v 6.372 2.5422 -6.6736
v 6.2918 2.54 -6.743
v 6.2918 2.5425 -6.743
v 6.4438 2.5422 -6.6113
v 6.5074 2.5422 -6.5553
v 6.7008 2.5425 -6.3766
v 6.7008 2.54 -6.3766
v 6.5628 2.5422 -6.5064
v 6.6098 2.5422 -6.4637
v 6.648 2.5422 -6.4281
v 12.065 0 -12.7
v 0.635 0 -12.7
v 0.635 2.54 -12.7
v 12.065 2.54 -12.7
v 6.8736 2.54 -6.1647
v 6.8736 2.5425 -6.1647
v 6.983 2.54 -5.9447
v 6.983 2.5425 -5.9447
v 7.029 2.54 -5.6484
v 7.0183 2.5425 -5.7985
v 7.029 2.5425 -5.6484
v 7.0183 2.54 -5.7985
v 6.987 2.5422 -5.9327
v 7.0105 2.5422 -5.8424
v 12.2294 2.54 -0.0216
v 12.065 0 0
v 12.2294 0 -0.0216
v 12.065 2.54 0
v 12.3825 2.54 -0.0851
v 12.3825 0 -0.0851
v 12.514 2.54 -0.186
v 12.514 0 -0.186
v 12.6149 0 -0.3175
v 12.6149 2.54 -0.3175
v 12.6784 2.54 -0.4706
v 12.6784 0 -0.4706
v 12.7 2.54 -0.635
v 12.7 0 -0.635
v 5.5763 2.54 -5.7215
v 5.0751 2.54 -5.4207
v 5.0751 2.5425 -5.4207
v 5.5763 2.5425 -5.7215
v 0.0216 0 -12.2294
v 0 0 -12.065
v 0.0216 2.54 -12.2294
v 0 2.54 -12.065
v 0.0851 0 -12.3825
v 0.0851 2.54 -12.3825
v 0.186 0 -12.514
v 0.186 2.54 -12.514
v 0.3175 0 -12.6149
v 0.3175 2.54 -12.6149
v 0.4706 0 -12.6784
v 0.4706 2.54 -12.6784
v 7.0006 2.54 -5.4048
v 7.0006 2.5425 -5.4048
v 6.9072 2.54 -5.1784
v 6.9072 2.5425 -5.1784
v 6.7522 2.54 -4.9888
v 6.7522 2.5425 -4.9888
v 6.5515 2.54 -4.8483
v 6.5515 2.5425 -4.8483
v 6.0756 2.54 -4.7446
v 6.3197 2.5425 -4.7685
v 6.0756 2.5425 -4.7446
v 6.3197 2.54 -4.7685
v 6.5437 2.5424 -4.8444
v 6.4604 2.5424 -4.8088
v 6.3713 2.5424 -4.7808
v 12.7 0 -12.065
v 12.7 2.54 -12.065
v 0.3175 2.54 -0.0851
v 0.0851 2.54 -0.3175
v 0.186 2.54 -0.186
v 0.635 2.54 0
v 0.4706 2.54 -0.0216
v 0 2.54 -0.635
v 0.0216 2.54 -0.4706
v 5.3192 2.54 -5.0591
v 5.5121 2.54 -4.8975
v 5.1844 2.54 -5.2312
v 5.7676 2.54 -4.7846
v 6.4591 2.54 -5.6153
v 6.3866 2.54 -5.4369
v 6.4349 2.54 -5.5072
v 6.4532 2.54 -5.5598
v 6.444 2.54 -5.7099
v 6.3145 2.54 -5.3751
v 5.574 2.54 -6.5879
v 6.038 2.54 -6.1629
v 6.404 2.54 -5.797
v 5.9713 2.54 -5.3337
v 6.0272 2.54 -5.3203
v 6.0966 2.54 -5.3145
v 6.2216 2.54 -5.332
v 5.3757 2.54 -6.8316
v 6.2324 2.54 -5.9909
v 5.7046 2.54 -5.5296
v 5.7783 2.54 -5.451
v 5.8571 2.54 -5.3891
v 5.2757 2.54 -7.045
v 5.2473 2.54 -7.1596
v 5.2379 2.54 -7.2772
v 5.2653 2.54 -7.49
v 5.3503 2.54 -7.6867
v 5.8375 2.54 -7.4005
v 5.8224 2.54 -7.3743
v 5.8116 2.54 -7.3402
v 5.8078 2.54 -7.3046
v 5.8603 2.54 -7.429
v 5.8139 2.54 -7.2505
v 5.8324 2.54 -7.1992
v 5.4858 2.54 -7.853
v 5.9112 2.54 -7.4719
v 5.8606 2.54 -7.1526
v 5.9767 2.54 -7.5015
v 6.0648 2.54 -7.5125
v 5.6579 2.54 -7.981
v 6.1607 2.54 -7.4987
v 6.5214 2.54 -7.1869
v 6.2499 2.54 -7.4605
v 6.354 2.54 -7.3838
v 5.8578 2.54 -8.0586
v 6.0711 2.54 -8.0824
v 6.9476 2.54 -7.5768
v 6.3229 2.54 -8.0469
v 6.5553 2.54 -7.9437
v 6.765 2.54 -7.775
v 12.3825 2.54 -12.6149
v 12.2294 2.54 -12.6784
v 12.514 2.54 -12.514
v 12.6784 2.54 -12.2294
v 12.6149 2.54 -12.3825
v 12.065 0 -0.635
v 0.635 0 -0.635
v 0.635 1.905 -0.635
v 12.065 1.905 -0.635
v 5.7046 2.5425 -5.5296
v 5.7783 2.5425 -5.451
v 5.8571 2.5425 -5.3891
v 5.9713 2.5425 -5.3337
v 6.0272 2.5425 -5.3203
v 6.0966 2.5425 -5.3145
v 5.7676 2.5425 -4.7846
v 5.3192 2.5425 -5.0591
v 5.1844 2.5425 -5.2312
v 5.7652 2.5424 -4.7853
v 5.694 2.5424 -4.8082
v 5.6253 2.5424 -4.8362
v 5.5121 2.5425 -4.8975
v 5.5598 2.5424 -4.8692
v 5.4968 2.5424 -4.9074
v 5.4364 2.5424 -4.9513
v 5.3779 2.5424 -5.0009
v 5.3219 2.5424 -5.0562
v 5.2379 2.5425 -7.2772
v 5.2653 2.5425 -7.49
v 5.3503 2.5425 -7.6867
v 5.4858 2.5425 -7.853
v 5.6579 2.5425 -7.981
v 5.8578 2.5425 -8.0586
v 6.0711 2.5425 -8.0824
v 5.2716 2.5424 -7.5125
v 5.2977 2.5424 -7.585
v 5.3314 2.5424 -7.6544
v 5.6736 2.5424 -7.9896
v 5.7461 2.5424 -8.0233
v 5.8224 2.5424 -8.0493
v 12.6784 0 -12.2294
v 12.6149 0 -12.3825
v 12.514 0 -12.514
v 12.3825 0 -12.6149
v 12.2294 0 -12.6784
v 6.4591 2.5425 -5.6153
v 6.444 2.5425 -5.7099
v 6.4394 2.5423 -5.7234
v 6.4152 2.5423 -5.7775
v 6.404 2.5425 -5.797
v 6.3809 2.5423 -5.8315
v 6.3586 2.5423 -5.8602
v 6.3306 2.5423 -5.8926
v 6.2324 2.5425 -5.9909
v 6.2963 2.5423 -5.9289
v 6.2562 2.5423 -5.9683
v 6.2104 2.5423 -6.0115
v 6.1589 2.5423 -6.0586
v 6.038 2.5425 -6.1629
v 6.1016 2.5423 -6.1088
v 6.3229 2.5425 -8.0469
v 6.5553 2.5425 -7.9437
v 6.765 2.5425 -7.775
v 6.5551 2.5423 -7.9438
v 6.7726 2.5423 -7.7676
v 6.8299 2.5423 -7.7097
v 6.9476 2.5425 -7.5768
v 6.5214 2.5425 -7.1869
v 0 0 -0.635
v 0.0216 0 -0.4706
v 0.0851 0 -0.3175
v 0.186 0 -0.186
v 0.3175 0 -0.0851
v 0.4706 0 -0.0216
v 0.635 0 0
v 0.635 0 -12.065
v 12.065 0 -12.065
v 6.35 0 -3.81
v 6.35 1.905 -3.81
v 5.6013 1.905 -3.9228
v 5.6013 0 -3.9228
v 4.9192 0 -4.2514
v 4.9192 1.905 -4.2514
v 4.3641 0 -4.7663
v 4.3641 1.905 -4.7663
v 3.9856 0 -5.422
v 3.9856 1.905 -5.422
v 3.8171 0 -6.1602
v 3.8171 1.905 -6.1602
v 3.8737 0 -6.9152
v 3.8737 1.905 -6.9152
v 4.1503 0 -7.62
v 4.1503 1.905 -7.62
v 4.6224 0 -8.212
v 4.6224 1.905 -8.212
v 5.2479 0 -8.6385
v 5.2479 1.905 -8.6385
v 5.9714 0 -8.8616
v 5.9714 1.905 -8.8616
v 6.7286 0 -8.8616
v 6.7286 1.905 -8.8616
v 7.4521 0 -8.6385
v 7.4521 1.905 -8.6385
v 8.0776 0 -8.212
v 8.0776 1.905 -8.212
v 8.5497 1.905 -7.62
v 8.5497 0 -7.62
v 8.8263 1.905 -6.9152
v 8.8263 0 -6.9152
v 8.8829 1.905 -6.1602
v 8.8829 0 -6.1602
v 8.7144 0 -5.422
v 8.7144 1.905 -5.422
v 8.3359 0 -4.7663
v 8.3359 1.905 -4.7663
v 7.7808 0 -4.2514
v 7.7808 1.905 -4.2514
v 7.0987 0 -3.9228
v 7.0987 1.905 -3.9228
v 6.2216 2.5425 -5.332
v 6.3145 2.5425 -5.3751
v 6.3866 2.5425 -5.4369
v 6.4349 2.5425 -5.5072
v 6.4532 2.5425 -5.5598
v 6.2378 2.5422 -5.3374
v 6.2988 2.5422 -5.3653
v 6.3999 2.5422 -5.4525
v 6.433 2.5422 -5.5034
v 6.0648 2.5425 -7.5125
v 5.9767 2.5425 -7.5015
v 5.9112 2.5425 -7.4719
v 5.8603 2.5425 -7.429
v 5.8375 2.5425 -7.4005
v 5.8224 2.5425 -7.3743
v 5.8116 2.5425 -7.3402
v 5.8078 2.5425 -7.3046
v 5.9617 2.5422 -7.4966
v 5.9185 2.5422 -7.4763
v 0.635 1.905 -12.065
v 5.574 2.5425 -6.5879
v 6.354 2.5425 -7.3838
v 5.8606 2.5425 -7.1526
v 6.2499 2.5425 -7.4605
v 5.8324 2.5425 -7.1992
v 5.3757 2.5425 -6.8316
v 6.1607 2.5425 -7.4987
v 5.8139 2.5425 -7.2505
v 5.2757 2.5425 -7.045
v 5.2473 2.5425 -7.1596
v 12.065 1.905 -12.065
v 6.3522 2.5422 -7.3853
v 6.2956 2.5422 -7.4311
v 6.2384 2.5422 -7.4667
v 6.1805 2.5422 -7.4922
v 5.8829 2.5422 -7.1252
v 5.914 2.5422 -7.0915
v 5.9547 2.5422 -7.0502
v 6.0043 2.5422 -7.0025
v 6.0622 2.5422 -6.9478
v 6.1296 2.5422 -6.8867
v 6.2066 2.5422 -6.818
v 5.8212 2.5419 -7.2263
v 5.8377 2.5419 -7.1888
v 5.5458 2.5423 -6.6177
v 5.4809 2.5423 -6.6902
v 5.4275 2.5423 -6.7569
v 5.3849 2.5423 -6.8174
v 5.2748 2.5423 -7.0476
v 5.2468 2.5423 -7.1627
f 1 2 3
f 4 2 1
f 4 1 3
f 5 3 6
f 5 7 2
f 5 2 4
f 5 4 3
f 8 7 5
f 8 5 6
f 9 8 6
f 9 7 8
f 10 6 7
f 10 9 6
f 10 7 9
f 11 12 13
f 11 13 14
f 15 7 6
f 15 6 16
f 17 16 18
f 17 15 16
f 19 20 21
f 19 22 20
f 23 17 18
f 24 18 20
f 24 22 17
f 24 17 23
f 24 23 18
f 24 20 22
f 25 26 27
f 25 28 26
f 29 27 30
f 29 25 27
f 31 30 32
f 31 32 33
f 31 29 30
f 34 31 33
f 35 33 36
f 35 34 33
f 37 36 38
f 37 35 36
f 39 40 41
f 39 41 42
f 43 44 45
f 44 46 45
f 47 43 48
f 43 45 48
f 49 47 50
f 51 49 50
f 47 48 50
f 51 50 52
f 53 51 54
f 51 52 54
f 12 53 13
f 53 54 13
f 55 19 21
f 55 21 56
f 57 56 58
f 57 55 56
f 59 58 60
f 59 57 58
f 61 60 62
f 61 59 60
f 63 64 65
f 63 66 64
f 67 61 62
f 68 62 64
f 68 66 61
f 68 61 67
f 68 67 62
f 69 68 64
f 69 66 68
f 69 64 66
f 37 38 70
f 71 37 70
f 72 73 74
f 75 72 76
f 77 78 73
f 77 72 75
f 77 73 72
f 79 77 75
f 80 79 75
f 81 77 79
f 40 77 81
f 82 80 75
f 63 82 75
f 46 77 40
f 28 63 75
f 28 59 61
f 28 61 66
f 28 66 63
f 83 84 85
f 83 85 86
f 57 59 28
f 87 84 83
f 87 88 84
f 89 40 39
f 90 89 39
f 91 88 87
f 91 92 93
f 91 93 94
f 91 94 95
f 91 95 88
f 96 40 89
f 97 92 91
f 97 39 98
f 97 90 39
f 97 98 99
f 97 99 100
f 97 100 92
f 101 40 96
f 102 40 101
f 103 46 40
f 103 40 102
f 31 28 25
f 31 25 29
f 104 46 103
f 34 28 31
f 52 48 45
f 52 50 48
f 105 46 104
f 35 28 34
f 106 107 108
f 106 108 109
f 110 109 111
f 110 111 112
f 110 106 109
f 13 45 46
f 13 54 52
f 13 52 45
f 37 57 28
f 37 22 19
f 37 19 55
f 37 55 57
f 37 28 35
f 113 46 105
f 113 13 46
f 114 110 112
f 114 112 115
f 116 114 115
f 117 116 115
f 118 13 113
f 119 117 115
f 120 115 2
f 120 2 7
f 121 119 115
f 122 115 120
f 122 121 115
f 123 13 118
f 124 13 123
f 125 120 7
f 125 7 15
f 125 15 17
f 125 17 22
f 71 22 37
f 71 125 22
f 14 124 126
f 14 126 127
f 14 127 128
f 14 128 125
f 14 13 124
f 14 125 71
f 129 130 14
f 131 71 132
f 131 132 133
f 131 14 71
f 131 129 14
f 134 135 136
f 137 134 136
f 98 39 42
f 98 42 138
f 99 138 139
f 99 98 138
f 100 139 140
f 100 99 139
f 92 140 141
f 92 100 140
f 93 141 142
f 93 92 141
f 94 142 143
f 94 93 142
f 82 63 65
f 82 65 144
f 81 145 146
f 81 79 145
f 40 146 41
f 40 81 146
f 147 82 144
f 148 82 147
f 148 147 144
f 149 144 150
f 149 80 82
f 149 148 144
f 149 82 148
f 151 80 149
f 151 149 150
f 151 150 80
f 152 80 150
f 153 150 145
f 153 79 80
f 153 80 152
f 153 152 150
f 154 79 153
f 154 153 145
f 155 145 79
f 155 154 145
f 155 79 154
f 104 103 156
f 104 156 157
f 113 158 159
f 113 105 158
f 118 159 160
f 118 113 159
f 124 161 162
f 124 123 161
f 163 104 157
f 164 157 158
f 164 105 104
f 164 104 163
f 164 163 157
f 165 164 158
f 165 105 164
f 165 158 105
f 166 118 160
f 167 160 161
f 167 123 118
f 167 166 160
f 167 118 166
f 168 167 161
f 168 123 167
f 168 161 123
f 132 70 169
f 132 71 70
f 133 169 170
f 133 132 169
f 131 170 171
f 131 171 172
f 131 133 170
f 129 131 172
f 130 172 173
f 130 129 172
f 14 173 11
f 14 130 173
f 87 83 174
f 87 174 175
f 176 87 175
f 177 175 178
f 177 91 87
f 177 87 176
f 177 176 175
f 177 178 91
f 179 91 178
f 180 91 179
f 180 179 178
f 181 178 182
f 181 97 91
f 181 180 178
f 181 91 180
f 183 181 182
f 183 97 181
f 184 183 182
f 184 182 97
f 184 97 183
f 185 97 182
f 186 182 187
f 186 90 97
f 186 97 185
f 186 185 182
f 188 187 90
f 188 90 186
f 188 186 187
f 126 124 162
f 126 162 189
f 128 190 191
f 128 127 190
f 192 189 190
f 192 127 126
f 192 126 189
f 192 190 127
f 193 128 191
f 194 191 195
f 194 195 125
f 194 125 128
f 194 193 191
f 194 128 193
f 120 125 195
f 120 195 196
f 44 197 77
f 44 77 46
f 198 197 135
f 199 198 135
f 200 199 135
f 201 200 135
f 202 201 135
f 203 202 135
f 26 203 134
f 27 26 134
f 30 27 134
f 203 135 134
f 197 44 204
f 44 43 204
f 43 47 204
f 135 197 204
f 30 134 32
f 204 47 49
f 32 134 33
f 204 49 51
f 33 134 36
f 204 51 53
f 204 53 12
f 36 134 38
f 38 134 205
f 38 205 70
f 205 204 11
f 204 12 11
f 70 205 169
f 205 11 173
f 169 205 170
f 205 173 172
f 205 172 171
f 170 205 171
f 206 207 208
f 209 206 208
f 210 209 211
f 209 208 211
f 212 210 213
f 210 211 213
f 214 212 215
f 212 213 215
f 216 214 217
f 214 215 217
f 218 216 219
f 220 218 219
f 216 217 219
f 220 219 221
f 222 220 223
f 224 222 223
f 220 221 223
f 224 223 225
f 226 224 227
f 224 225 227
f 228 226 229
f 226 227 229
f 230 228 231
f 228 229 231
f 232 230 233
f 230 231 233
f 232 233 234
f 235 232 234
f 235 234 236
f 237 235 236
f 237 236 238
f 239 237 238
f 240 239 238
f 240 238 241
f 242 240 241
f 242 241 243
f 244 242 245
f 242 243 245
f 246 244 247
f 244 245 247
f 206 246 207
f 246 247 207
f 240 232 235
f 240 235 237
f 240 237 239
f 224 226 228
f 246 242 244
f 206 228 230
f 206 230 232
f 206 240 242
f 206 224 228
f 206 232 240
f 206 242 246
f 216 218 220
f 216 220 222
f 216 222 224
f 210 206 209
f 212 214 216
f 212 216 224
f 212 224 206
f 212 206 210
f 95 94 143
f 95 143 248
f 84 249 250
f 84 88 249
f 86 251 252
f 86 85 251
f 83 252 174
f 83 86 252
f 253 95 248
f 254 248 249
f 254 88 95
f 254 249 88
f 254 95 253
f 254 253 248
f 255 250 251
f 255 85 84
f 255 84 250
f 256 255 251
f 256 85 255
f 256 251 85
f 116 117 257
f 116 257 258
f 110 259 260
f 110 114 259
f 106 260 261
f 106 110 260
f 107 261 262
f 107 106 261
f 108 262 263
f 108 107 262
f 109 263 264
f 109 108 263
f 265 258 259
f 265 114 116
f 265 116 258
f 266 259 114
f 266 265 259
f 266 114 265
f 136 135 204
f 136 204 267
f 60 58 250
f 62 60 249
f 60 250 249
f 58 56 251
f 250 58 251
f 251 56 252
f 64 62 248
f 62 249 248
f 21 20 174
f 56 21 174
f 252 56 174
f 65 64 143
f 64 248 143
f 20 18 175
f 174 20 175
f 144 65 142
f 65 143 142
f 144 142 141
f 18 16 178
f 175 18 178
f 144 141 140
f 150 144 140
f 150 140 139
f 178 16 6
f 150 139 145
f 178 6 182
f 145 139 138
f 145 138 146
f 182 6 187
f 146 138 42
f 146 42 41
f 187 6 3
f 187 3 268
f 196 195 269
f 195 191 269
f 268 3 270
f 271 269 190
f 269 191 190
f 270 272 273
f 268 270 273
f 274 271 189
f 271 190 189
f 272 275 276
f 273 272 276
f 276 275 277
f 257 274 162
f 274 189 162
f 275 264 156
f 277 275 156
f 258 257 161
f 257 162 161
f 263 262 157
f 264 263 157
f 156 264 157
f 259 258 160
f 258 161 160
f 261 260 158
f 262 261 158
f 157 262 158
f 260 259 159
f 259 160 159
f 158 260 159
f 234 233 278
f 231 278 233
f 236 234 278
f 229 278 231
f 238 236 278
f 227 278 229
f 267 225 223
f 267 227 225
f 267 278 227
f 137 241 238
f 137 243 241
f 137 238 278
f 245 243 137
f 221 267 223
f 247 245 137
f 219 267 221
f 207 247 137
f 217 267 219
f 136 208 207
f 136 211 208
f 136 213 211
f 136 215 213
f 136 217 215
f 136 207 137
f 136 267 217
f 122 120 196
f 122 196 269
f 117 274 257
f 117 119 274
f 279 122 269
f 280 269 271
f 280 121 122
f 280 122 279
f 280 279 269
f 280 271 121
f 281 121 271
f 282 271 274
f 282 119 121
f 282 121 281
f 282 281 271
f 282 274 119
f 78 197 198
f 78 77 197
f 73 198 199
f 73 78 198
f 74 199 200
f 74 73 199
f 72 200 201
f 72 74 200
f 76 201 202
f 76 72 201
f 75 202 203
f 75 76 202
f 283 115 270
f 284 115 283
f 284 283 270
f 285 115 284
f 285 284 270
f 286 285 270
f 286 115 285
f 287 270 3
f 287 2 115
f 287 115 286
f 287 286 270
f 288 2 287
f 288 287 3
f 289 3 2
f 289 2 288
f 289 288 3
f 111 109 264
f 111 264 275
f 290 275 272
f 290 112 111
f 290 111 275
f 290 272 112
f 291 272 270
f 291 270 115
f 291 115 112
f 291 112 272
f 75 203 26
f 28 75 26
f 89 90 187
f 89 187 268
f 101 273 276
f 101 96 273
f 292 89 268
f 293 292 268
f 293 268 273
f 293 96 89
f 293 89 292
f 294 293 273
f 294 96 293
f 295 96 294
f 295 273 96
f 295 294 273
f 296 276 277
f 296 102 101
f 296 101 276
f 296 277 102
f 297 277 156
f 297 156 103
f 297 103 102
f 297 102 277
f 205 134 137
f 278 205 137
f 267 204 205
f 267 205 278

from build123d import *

# Parameters (mm, degrees)
SKETCH1_W           = 12.7
SKETCH1_H           = 12.7
BOSS_EXTRUDE1_DEPTH = 2.54
FILLET1_R           = 0.635
SHELL1_START        = 0.635
SHELL1_OUTLINE_W    = 1.905
SHELL1_OUTLINE_H    = 11.43
SHELL1_DEPTH        = 11.43
SKETCH2_R           = 2.54
BOSS_EXTRUDE2_DEPTH = 1.905
BOSS_EXTRUDE3_DEPTH = 0.00254


# Read off the part's stored shape, not the designer's step: Shell1
with BuildPart() as part:
    # Sketch1 → Boss-Extrude1 (new body)
    with BuildSketch(Plane(origin=(0, 0, 0), x_dir=(1, 0, 0), z_dir=(0, 1, 0))):
        with Locations((6.35, 6.35)):
            Rectangle(SKETCH1_W, SKETCH1_H)
    extrude(amount=BOSS_EXTRUDE1_DEPTH)

    # Fillet1
    fillet1_edges = [part.edges().sort_by_distance(p)[0] for p in [
        (0, 1.27, -12.7),
        (12.7, 1.27, -12.7),
        (12.7, 1.27, 0),
        (0, 1.27, 0),
    ]]
    fillet(fillet1_edges, radius=FILLET1_R)

    # Shell1 outline → Shell1 (cut)
    with BuildSketch(Plane.YZ.offset(SHELL1_START)):
        with Locations((0.9525, -6.35)):
            Rectangle(SHELL1_OUTLINE_W, SHELL1_OUTLINE_H)
    extrude(amount=SHELL1_DEPTH, mode=Mode.SUBTRACT)

    # Sketch2 → Boss-Extrude2 (add)
    with BuildSketch(Plane(origin=(0, 1.905, 0), x_dir=(-1, 0, 0), z_dir=(0, -1, 0))):
        with Locations(Location((-6.35, 6.35, 0), (0, 0, 270))):
            Circle(SKETCH2_R)
    extrude(amount=BOSS_EXTRUDE2_DEPTH)

    # Sketch3 → Boss-Extrude3 (add)
    with BuildSketch(Plane(origin=(0, 2.54, 0), x_dir=(1, 0, 0), z_dir=(0, 1, 0))):
        with BuildLine():
            Line((6.947551282, 7.576776242), (6.521419471, 7.186897436))
            add(Edge.make_bspline(
                [(6.521419471, 7.186897436), (6.503165812, 7.21264612), (6.468121331, 7.262080004), (6.411317883, 7.328273139), (6.354770931, 7.384740809), (6.297956603, 7.431247119), (6.240371318, 7.467509507), (6.182115036, 7.493183679), (6.123518028, 7.509504993), (6.084149883, 7.51153739), (6.064758814, 7.512538462)],
                knots=[0, 0, 0, 0, 1.299362458, 2.494594718, 3.587462134, 4.587049575, 5.512617175, 6.380583204, 7.202344345, 8, 8, 8, 8], degree=3))
            add(Edge.make_bspline(
                [(6.064758814, 7.512538462), (6.046671381, 7.511904137), (6.0117493, 7.510679422), (5.961965283, 7.498505847), (5.917766323, 7.477496044), (5.879195557, 7.45002396), (5.84864182, 7.416926467), (5.82424703, 7.382215707), (5.810510714, 7.343902879), (5.808702744, 7.317588082), (5.807807692, 7.304560697)],
                knots=[0, 0, 0, 0, 1.185010067, 2.2879431, 3.333075148, 4.379039566, 5.372662701, 6.27520591, 7.14612461, 8, 8, 8, 8], degree=3))
            add(Edge.make_bspline(
                [(5.807807692, 7.304560697), (5.808368576, 7.291345451), (5.809498118, 7.264731783), (5.820407957, 7.225726137), (5.836852199, 7.18761308), (5.852565344, 7.164411849), (5.860597155, 7.152552484)],
                knots=[0, 0, 0, 0, 0.967525499, 1.948461899, 2.951351359, 4, 4, 4, 4], degree=3))
            add(Edge.make_bspline(
                [(5.860597155, 7.152552484), (5.867898941, 7.143334324), (5.884706688, 7.122115336), (5.916755618, 7.088507766), (5.957002343, 7.047335552), (6.006995642, 7.000014485), (6.064660156, 6.944842714), (6.132668709, 6.883989063), (6.209063719, 6.815568965), (6.263363522, 6.767923686), (6.291817107, 6.742957131)],
                knots=[0, 0, 0, 0, 0.473873513, 1.090794244, 1.870441696, 2.795289791, 3.865433203, 5.087734844, 6.473946851, 8, 8, 8, 8], degree=3))
            add(Edge.make_bspline(
                [(6.291817107, 6.742957131), (6.31852489, 6.719842892), (6.369210714, 6.675976869), (6.441326575, 6.613716092), (6.504704406, 6.557701589), (6.560267478, 6.508774018), (6.607173508, 6.466420016), (6.645619689, 6.430437133), (6.676075577, 6.401525888), (6.693387966, 6.384063478), (6.700776442, 6.376610978)],
                knots=[0, 0, 0, 0, 1.543621617, 2.929473131, 4.163658386, 5.240097082, 6.164993805, 6.925417477, 7.541396219, 8, 8, 8, 8], degree=3))
            add(Edge.make_bspline(
                [(6.700776442, 6.376610978), (6.72880678, 6.346276149), (6.782690932, 6.287961956), (6.852721334, 6.197593297), (6.910358621, 6.109375058), (6.954947919, 6.021647272), (6.98862355, 5.9331442), (7.012365316, 5.84169531), (7.026584417, 5.746345018), (7.02816307, 5.681280084), (7.028961538, 5.648370793)],
                knots=[0, 0, 0, 0, 1.206664779, 2.319633467, 3.337109185, 4.282041471, 5.190008762, 6.099243693, 7.03861361, 8, 8, 8, 8], degree=3))
            add(Edge.make_bspline(
                [(7.028961538, 5.648370793), (7.028393209, 5.616304725), (7.027278125, 5.553389906), (7.013620483, 5.46132344), (6.994145488, 5.373211837), (6.96403373, 5.290013874), (6.927333696, 5.210363884), (6.881324904, 5.135502559), (6.827293886, 5.064672272), (6.765366044, 4.999139201), (6.696866497, 4.939672482), (6.623394222, 4.886733804), (6.544230772, 4.843026182), (6.460052505, 4.807036073), (6.370904481, 4.77931601), (6.276892901, 4.7588283), (6.17787397, 4.746531899), (6.110163397, 4.745246456), (6.075571114, 4.744589744)],
                knots=[0, 0, 0, 0, 1.043214005, 2.046824704, 3.02475056, 3.976699089, 4.921714032, 5.875962561, 6.831408892, 7.817874052, 8.806269674, 9.781291748, 10.760897367, 11.74438705, 12.757449933, 13.795994037, 14.874007457, 16, 16, 16, 16], degree=3))
            add(Edge.make_bspline(
                [(6.075571114, 4.744589744), (6.048416466, 4.745071485), (5.994634689, 4.74602561), (5.915368481, 4.753815242), (5.838827997, 4.766386881), (5.765099453, 4.784405794), (5.693850688, 4.807238201), (5.625078777, 4.835127112), (5.559258474, 4.868504794), (5.495891752, 4.906684869), (5.435286652, 4.951016965), (5.376676846, 5.000594728), (5.320644503, 5.056180684), (5.266920509, 5.117643377), (5.215848607, 5.185156853), (5.165757029, 5.257780861), (5.118871997, 5.336863206), (5.089909027, 5.392340111), (5.075115385, 5.420676482)],
                knots=[0, 0, 0, 0, 1.016823716, 2.013894106, 2.979844003, 3.91962641, 4.853723003, 5.779685073, 6.695824784, 7.614987388, 8.547259901, 9.504950863, 10.487499108, 11.500346958, 12.559593716, 13.656357062, 14.802919212, 16, 16, 16, 16], degree=3))
            Line((5.075115385, 5.420676482), (5.576297276, 5.721512821))
            add(Edge.make_bspline(
                [(5.576297276, 5.721512821), (5.594801911, 5.689347337), (5.630276879, 5.627683355), (5.690392527, 5.54482998), (5.751977941, 5.473879779), (5.816456918, 5.416086802), (5.883045419, 5.370678281), (5.952065082, 5.338226202), (6.023564398, 5.318138402), (6.072266484, 5.315685218), (6.096559696, 5.314461538)],
                knots=[0, 0, 0, 0, 1.283663364, 2.460892379, 3.537111102, 4.529833553, 5.449777664, 6.316464042, 7.160231139, 8, 8, 8, 8], degree=3))
            add(Edge.make_bspline(
                [(6.096559696, 5.314461538), (6.12126937, 5.315460861), (6.169209736, 5.317399693), (6.237638475, 5.335308096), (6.300376534, 5.363425604), (6.354606849, 5.403545409), (6.40052566, 5.449849762), (6.434416378, 5.501365473), (6.455706756, 5.557104227), (6.457957665, 5.595824033), (6.459089744, 5.615297877)],
                knots=[0, 0, 0, 0, 1.13588714, 2.203786484, 3.234766741, 4.283437687, 5.291419208, 6.222934724, 7.106237994, 8, 8, 8, 8], degree=3))
            add(Edge.make_bspline(
                [(6.459089744, 5.615297877), (6.458044316, 5.633415119), (6.455920629, 5.670218563), (6.440278206, 5.724939365), (6.415824328, 5.779635282), (6.386893665, 5.824498352), (6.357453094, 5.862060985), (6.329301267, 5.894607307), (6.295019789, 5.930565296), (6.254695583, 5.969980182), (6.208861436, 6.013198947), (6.157478739, 6.060217356), (6.099959106, 6.110621236), (6.059304117, 6.14495586), (6.038046074, 6.162909054)],
                knots=[0, 0, 0, 0, 0.916159276, 1.861089862, 2.860218735, 3.940849679, 4.552606315, 5.27541173, 6.11797699, 7.06649574, 8.129236253, 9.306560635, 10.591630461, 12, 12, 12, 12], degree=3))
            add(Edge.make_bspline(
                [(6.038046074, 6.162909054), (5.997633688, 6.197101808), (5.920070088, 6.262728051), (5.810462881, 6.359655946), (5.711696974, 6.450243946), (5.624625414, 6.535611915), (5.548138776, 6.614183306), (5.482755059, 6.686596305), (5.429192535, 6.75340948), (5.372829528, 6.832545214), (5.319273403, 6.928977544), (5.272985712, 7.044996816), (5.242956212, 7.161001367), (5.239591824, 7.238880433), (5.237935897, 7.277211939)],
                knots=[0, 0, 0, 0, 1.345494975, 2.582412109, 3.71882943, 4.751509156, 5.681369928, 6.505683931, 7.230279997, 7.856715994, 8.973648664, 10.023341002, 11.027102913, 12, 12, 12, 12], degree=3))
            add(Edge.make_bspline(
                [(5.237935897, 7.277211939), (5.238624595, 7.304394586), (5.239981404, 7.35794732), (5.252084347, 7.436688812), (5.270172657, 7.512667736), (5.296442076, 7.585606886), (5.33053661, 7.655414903), (5.371943098, 7.722433526), (5.421304502, 7.786045931), (5.476931473, 7.846209948), (5.538218153, 7.901193012), (5.603710758, 7.949721076), (5.673038596, 7.990708584), (5.745777553, 8.024710699), (5.822378363, 8.050737157), (5.90227671, 8.069186008), (5.985587195, 8.080158796), (6.042253188, 8.08165042), (6.07111899, 8.082410256)],
                knots=[0, 0, 0, 0, 1.010766082, 1.991317756, 2.957454644, 3.913069143, 4.869106762, 5.843196583, 6.838735724, 7.860187025, 8.887984031, 9.89767229, 10.887916223, 11.879572884, 12.879850636, 13.892031539, 14.926195476, 16, 16, 16, 16], degree=3))
            add(Edge.make_bspline(
                [(6.07111899, 8.082410256), (6.108527641, 8.081041768), (6.183049652, 8.078315594), (6.293232593, 8.056997805), (6.400854684, 8.023473336), (6.487578582, 7.983029753), (6.556583169, 7.943852034), (6.609468739, 7.907782126), (6.663282653, 7.866462108), (6.718458887, 7.819761769), (6.773972181, 7.766801214), (6.831401043, 7.70884121), (6.889962936, 7.645380848), (6.92801888, 7.600045059), (6.947551282, 7.576776242)],
                knots=[0, 0, 0, 0, 1.282922637, 2.555718331, 3.837320111, 5.142675274, 5.830281639, 6.55870424, 7.337177975, 8.157850921, 9.037902056, 9.96903443, 10.957596896, 12, 12, 12, 12], degree=3))
        make_face()
    extrude(amount=BOSS_EXTRUDE3_DEPTH)


solid = part.part
